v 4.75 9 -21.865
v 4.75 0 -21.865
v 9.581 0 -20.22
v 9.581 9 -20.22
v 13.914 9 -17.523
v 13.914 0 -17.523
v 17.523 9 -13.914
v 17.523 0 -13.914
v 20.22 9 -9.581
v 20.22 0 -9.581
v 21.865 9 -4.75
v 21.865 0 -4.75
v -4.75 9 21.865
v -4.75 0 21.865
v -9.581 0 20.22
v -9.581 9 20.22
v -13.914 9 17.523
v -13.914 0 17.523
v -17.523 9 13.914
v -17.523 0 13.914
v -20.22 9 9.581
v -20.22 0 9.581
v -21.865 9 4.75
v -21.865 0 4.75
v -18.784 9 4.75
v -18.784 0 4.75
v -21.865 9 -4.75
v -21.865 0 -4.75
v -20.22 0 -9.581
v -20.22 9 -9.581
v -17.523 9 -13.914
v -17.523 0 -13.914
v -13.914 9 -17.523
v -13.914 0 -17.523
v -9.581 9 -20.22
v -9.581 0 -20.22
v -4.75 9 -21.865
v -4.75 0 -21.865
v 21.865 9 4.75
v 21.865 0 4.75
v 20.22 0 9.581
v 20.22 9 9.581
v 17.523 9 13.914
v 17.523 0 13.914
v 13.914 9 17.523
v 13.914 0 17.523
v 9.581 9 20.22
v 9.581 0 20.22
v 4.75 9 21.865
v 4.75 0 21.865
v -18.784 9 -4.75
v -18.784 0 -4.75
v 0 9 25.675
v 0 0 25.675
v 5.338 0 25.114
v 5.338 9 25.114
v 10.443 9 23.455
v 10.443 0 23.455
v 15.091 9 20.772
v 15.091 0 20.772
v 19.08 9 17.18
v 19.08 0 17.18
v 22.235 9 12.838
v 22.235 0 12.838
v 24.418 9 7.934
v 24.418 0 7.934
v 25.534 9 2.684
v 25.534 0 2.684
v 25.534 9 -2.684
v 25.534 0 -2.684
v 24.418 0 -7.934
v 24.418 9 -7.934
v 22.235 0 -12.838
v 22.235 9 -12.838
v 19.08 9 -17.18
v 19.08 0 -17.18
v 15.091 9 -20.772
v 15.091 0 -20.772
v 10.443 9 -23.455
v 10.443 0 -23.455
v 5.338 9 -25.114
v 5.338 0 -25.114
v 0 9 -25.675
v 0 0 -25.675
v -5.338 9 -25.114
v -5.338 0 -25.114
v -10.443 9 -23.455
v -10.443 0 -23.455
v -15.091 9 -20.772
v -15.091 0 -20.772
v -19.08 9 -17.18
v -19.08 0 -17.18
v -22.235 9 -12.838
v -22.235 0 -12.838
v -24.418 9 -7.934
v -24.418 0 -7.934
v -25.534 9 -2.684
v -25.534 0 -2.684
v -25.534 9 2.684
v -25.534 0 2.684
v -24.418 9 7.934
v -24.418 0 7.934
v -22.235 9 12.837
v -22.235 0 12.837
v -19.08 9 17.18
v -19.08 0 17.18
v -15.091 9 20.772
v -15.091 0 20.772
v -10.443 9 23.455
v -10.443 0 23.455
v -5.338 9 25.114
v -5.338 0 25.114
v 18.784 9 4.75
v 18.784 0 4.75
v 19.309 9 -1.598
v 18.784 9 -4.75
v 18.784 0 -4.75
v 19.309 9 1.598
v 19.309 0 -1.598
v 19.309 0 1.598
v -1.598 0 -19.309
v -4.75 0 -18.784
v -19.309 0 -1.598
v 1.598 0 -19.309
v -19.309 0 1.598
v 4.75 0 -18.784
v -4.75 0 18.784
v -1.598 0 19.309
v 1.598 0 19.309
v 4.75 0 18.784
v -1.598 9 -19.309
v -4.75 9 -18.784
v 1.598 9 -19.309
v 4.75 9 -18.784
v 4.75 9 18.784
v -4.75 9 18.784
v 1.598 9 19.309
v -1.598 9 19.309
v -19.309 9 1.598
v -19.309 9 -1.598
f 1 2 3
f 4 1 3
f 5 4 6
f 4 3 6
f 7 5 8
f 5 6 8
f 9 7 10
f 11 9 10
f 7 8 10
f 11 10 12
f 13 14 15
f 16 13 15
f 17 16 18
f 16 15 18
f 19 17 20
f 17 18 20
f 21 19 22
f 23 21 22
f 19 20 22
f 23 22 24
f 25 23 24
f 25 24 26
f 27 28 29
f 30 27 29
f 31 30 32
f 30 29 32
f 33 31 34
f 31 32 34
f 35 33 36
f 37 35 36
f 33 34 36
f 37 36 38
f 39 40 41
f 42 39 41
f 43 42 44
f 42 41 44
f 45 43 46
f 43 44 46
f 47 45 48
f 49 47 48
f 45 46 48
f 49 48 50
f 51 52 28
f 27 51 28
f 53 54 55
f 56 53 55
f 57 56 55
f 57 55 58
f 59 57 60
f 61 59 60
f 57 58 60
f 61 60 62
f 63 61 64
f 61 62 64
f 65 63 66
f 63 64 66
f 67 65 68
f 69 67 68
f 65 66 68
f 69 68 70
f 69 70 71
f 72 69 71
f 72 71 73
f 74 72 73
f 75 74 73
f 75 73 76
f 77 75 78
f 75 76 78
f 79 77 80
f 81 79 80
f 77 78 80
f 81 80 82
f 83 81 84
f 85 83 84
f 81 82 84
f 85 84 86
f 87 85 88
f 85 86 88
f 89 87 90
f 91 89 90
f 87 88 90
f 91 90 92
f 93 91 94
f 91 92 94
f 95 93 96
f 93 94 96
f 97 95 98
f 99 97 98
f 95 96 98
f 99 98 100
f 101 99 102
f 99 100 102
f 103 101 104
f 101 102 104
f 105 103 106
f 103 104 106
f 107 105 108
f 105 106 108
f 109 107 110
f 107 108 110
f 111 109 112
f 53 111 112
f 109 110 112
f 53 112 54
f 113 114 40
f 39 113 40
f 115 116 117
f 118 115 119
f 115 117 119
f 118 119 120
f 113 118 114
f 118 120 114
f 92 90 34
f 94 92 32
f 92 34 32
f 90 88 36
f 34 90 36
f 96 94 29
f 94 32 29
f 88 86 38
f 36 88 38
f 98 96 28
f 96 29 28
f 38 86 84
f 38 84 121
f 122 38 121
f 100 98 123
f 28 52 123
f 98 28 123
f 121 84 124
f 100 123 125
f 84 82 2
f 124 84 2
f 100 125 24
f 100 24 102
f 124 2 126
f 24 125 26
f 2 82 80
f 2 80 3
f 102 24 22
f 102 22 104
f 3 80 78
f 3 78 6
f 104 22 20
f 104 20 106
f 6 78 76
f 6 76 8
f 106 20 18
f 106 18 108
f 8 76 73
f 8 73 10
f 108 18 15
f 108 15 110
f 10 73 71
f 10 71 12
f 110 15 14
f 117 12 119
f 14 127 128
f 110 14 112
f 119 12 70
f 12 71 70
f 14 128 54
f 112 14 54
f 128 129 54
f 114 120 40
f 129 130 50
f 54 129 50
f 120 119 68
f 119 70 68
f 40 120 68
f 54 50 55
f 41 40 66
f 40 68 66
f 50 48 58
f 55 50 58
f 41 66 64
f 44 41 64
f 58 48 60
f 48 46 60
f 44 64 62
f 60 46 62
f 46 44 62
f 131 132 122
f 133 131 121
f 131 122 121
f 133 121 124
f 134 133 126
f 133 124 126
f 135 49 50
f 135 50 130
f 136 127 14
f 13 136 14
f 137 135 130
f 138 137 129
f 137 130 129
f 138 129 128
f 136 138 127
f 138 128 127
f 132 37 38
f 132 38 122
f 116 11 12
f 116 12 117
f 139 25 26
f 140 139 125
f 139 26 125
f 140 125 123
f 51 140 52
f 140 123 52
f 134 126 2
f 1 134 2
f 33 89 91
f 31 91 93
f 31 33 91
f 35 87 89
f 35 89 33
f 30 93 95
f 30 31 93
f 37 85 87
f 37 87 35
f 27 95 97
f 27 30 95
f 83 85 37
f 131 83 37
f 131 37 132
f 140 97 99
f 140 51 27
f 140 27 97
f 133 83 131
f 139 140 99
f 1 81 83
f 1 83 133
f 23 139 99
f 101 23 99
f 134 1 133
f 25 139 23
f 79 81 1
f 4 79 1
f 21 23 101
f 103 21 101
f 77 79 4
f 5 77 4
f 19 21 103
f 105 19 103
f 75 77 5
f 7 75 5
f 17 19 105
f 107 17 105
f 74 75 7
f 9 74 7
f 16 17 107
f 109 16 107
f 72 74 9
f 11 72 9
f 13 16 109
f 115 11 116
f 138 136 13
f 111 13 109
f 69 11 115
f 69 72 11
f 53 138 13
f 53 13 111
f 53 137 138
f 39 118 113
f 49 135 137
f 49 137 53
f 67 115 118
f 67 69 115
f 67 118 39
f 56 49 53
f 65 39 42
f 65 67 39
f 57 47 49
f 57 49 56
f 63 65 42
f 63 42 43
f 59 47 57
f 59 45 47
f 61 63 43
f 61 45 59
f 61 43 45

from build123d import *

# Parameters (mm, degrees)
SKETCH_1_R      = 25.675
EXTRUDE_1_DEPTH = 9


with BuildPart() as part:
    # Эскиз1 → Бобышка-Вытянуть1 (new body)
    with BuildSketch(Plane(origin=(0, 0, 0), x_dir=(1, 0, 0), z_dir=(0, 1, 0))):
        with Locations(Location((0, 0, 0), (0, 0, 270))):
            Circle(SKETCH_1_R)
        with BuildLine():
            Line((-4.75, 21.864997713), (-4.75, 18.78371968))
            ThreePointArc((-4.75, 18.78371968), (0, 19.375), (4.75, 18.78371968))
            Line((4.75, 18.78371968), (4.75, 21.864997713))
            ThreePointArc((4.75, 21.864997713), (15.821514229, 15.821514229), (21.864997713, 4.75))
            Line((21.864997713, 4.75), (18.78371968, 4.75))
            ThreePointArc((18.78371968, 4.75), (19.375, 0), (18.78371968, -4.75))
            Line((18.78371968, -4.75), (21.864997713, -4.75))
            ThreePointArc((21.864997713, -4.75), (15.821514229, -15.821514229), (4.75, -21.864997713))
            Line((4.75, -21.864997713), (4.75, -18.78371968))
            ThreePointArc((4.75, -18.78371968), (0, -19.375), (-4.75, -18.78371968))
            Line((-4.75, -18.78371968), (-4.75, -21.864997713))
            ThreePointArc((-4.75, -21.864997713), (-15.821514229, -15.821514229), (-21.864997713, -4.75))
            Line((-21.864997713, -4.75), (-18.78371968, -4.75))
            ThreePointArc((-18.78371968, -4.75), (-19.375, 0), (-18.78371968, 4.75))
            Line((-18.78371968, 4.75), (-21.864997713, 4.75))
            ThreePointArc((-21.864997713, 4.75), (-15.821514229, 15.821514229), (-4.75, 21.864997713))
        make_face(mode=Mode.SUBTRACT)
    extrude(amount=EXTRUDE_1_DEPTH)


solid = part.part
